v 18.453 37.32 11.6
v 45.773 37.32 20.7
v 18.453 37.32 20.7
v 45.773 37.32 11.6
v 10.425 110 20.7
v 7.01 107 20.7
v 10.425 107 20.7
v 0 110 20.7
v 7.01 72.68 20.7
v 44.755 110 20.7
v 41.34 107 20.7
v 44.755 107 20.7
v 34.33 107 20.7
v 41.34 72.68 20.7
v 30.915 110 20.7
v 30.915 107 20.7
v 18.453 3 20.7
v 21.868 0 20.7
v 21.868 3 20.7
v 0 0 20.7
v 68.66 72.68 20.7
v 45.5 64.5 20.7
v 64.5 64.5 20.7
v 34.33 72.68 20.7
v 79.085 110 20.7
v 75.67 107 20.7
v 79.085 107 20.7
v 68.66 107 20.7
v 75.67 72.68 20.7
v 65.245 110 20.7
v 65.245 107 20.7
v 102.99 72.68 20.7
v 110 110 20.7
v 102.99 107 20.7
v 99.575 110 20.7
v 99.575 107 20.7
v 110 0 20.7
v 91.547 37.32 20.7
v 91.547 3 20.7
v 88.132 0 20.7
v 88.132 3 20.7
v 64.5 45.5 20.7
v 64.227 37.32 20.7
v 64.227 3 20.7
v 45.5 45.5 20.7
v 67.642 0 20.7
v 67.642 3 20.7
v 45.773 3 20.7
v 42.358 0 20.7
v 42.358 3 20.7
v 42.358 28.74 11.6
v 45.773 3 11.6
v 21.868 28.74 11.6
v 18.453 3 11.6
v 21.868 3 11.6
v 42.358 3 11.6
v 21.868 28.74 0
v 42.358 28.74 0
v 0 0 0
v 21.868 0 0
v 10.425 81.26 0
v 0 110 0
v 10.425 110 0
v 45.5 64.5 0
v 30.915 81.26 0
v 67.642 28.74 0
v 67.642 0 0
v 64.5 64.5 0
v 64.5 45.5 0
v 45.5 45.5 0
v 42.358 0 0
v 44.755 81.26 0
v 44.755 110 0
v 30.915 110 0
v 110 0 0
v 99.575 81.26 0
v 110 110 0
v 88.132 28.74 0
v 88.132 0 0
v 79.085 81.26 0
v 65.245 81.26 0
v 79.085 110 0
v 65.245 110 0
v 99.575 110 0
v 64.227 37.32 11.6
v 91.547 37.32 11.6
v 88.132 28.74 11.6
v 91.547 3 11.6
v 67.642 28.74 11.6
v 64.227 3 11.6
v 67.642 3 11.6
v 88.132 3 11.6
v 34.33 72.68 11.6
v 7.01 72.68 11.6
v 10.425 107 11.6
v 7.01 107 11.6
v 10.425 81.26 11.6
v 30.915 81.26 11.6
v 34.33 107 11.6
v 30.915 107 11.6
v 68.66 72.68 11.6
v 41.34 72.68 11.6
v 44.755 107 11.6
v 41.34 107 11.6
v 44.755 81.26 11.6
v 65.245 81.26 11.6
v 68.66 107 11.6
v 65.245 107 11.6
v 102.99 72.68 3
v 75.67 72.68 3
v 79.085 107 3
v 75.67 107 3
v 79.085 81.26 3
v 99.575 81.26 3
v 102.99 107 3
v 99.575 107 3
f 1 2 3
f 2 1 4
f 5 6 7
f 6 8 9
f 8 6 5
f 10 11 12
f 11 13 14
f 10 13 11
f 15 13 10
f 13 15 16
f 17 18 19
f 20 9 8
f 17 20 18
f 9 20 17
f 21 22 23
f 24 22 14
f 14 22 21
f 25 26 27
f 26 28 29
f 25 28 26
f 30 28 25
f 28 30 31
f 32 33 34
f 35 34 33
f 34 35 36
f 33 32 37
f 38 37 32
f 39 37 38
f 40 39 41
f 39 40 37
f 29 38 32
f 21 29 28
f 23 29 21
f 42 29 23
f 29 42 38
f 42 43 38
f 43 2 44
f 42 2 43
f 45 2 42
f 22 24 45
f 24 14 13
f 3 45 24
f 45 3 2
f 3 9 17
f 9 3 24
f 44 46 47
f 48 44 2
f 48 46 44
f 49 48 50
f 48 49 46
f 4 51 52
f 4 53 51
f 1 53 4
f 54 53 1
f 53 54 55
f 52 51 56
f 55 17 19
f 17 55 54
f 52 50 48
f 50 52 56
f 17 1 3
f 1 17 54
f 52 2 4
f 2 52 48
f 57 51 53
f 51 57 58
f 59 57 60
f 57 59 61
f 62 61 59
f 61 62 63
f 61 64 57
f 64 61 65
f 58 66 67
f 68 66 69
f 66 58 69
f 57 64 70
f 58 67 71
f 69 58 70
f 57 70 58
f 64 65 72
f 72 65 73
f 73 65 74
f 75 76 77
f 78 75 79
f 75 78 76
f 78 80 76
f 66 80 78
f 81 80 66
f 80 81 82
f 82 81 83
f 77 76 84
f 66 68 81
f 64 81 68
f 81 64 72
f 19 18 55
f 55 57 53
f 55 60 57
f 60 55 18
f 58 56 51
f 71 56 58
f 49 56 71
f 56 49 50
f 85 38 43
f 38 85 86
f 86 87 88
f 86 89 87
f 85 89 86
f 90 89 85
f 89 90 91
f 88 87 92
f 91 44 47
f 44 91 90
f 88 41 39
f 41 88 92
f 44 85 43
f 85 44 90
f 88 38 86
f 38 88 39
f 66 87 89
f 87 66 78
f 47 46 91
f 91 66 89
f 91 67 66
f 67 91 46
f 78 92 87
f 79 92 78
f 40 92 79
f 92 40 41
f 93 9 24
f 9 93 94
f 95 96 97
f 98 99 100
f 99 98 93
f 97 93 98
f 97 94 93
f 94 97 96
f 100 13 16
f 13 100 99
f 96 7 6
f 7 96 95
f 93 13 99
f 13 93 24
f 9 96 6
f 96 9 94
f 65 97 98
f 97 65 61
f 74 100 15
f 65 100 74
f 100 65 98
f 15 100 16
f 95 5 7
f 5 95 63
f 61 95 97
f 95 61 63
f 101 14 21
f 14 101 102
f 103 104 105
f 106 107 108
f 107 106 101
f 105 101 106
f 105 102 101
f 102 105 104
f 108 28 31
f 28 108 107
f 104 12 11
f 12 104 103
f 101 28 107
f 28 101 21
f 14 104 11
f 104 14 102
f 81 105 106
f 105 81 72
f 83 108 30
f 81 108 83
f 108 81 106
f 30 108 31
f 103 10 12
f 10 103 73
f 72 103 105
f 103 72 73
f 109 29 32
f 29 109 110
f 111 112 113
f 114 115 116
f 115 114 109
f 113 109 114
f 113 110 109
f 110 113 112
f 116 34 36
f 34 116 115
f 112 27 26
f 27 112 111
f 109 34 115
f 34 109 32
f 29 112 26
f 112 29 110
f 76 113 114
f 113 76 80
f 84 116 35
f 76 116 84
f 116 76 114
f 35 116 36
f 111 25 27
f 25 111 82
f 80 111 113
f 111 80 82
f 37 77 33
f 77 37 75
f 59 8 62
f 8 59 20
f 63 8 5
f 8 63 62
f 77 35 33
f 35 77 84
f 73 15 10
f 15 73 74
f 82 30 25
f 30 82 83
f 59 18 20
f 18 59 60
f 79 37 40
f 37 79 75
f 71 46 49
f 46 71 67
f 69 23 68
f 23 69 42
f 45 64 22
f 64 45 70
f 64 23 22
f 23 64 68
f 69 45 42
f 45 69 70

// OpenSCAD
// file: SquarePileLib.scad
module LeftPile(wallThickness, totalHeight, singlePileHeight, singlePileWidth, singlePileLength, pileCount){
    pileHeight = (pileCount * singlePileHeight) + .5;
    lengthOpeningSize = singlePileLength * .75;
    widthOpeningSize = singlePileWidth * .75;
    blockerSize = (singlePileWidth - widthOpeningSize) / 2;
    
    translate([wallThickness, wallThickness, totalHeight - pileHeight])
        cube([singlePileLength, singlePileWidth, pileHeight]);
    translate([-.00001, wallThickness + (blockerSize), 0])
        cube([wallThickness + lengthOpeningSize, widthOpeningSize, totalHeight]);
}

module RightPile(wallThickness, totalHeight, singlePileHeight, singlePileWidth, singlePileLength, pileCount){
    translate([0, wallThickness + wallThickness + singlePileWidth, 0])
        rotate([0, 0, 180])
            LeftPile(wallThickness, totalHeight, singlePileHeight, singlePileWidth, singlePileLength, pileCount);
}

module BottomPile(wallThickness, totalHeight, singlePileHeight, singlePileWidth, singlePileLength, pileCount){
    translate([wallThickness + wallThickness + singlePileWidth, 0, 0])
        rotate([0, 0, 90])
            LeftPile(wallThickness, totalHeight, singlePileHeight, singlePileWidth, singlePileLength, pileCount);
}

module TopPile(wallThickness, totalHeight, singlePileHeight, singlePileWidth, singlePileLength, pileCount){
        rotate([0, 0, 270])
            LeftPile(wallThickness, totalHeight, singlePileHeight, singlePileWidth, singlePileLength, pileCount);
}
// file: CoreLib.scad
function whiteSpaceBetweenBoxes(side, numberOfBoxes, boxLength) =
    (side - (numberOfBoxes * boxLength)) / (numberOfBoxes + 1);
    
function getOffsetForWhiteSpace(whiteSpaceBetweenBoxes, index, boxLength, singleBoxOffset) =
    ((index + 1) * whiteSpaceBetweenBoxes + boxLength * (index)) + singleBoxOffset;
// file: ColonistsBuildingsLib.scad
include<SquarePileLib.scad>
//25.82 by 32.82 by 2.15
singleBuildingPileHeight = 2.15;
singleBuildingPileWidth = 25.82 + 1.5;
singleBuildingPileLength = 32.82 + 1.5;

module LeftBuildingPile(wallThickness, totalHeight, buildingPileCount){
    LeftPile(
        wallThickness,
        totalHeight,
        singleBuildingPileHeight,
        singleBuildingPileWidth,
        singleBuildingPileLength,
        buildingPileCount);
}

module RightBuildingPile(wallThickness, totalHeight, buildingPileCount){
    RightPile(
        wallThickness,
        totalHeight,
        singleBuildingPileHeight,
        singleBuildingPileWidth,
        singleBuildingPileLength,
        buildingPileCount);
}

module BottomBuildingPile(wallThickness, totalHeight, buildingPileCount){
    BottomPile(
        wallThickness,
        totalHeight,
        singleBuildingPileHeight,
        singleBuildingPileWidth,
        singleBuildingPileLength,
        buildingPileCount);
}

module TopBuildingPile(wallThickness, totalHeight, buildingPileCount){
    TopPile(
        wallThickness,
        totalHeight,
        singleBuildingPileHeight,
        singleBuildingPileWidth,
        singleBuildingPileLength,
        buildingPileCount);
}

function buildingPileHeight(buildingPileCount) =
    (buildingPileCount * singleBuildingPileHeight) + .5;
// main file
include<ColonistsBuildingsLib.scad>
include<CoreLib.scad>
magnetHoleWidth = 19;
floorThickness = 3;
wallThickness = 3;
maxBuildingsPerStack = 8;
height = buildingPileHeight(maxBuildingsPerStack) + floorThickness;
length = 110;
width = 110;
numberOfTopBoxes = 3;
topBoxBuildingsPerStack = [4, 4, 8];
numberOfBottomBoxes = 2;
bottomBoxBuildingsPerStack = [4, 4];
numberOfLeftBoxes = 0;
leftBoxBuildingsPerStack = [];
numberOfRightBoxes = 0;
rightBoxBuildingsPerStack = [];

difference() {

//    whitespace between boxes = (total length - (# of boxes * width of boxes)) / (# of boxes + 1)
//    position of box n = whitespace * n + 1 + width of box * (n)
    
    cube([length, width, height]);

    whiteSpaceBetweenTopBoxes = whiteSpaceBetweenBoxes(length, numberOfTopBoxes, singleBuildingPileWidth);
    whiteSpaceBetweenBottomBoxes = whiteSpaceBetweenBoxes(length, numberOfBottomBoxes, singleBuildingPileWidth);
    remainingWidth = width - (2 * singleBuildingPileWidth);
    whiteSpaceBetweenLeftBoxes = whiteSpaceBetweenBoxes(remainingWidth, numberOfLeftBoxes, singleBuildingPileWidth);
    whiteSpaceBetweenRightBoxes = whiteSpaceBetweenBoxes(remainingWidth, numberOfRightBoxes, singleBuildingPileWidth);

    if (numberOfBottomBoxes != 0)
    {
        for(i=[0:numberOfBottomBoxes - 1]){
            translate([
                getOffsetForWhiteSpace(whiteSpaceBetweenBottomBoxes, i, singleBuildingPileWidth, -wallThickness),
                0,
                0])
                BottomBuildingPile(wallThickness, height, bottomBoxBuildingsPerStack[i]);
        }
    }
    
    
    if (numberOfTopBoxes != 0)
    {
        for(i=[0:numberOfTopBoxes - 1]){
            translate([
                getOffsetForWhiteSpace(whiteSpaceBetweenTopBoxes, i, singleBuildingPileWidth, -wallThickness),
                width,
                0])
                TopBuildingPile(wallThickness, height, topBoxBuildingsPerStack[i]);
        }
    }
    
    if (numberOfLeftBoxes != 0)
    {
        for(i=[0:numberOfLeftBoxes - 1]){
            translate([
                0,
                getOffsetForWhiteSpace(whiteSpaceBetweenLeftBoxes, i, singleBuildingPileWidth, singleBuildingPileWidth - wallThickness),
                0])
                LeftBuildingPile(wallThickness, height, leftBoxBuildingsPerStack[i]);
        }
    }
    
    if (numberOfRightBoxes != 0)
    {
        for(i=[0:numberOfRightBoxes - 1]){
            translate([
                length,
                getOffsetForWhiteSpace(whiteSpaceBetweenRightBoxes, i, singleBuildingPileWidth, singleBuildingPileWidth - wallThickness),
                0])
                RightBuildingPile(wallThickness, height, rightBoxBuildingsPerStack[i]);
        }
    }
    
    translate([length/2 - magnetHoleWidth/2, width/2 - magnetHoleWidth/2, 0])
        cube([magnetHoleWidth, magnetHoleWidth, height]);
}
